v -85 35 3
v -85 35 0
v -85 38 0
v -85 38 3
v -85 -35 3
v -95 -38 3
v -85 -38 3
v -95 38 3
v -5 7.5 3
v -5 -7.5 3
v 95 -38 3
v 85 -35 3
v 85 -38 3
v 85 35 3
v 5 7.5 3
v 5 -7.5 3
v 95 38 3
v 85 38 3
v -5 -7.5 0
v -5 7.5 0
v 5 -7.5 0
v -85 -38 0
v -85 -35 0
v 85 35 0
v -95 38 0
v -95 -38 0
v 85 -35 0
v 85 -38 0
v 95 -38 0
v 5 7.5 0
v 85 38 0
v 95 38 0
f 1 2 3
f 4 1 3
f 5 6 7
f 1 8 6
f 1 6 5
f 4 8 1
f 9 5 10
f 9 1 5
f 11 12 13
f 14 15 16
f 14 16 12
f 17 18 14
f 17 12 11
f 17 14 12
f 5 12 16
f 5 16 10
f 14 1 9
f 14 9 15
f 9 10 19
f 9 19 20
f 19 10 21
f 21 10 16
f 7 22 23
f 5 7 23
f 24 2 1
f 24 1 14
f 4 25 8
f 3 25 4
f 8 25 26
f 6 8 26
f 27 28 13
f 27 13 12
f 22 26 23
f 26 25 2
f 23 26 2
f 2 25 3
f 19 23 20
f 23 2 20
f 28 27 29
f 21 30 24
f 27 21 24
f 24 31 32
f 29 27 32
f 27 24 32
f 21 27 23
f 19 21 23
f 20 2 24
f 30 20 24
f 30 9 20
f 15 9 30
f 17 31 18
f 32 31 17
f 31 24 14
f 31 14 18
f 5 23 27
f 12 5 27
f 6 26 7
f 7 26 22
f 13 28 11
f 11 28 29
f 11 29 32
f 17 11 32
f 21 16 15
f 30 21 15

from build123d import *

# Parameters (mm, degrees)
ESBO_O1_W                = 10
ESBO_O1_H                = 3
ESBO_O1_W_2              = 190
ESBO_O1_H_2              = 70
RESSALTO_EXTRUS_O1_DEPTH = 3
ESBO_O2_W                = 10
ESBO_O2_H                = 15
CORTE_EXTRUS_O1_DEPTH    = 10


with BuildPart() as part:
    # Esboço1 → Ressalto-extrusão1 (new body)
    with BuildSketch(Plane.XY):
        with Locations((-90, -36.5)):
            Rectangle(ESBO_O1_W, ESBO_O1_H)
        with Locations((-90, 36.5)):
            Rectangle(ESBO_O1_W, ESBO_O1_H)
        Rectangle(ESBO_O1_W_2, ESBO_O1_H_2)
        with Locations((90, 36.5)):
            Rectangle(ESBO_O1_W, ESBO_O1_H)
        with Locations((90, -36.5)):
            Rectangle(ESBO_O1_W, ESBO_O1_H)
    extrude(amount=RESSALTO_EXTRUS_O1_DEPTH)

    # Esboço2 → Corte-extrusão1 (cut)
    with BuildSketch(Plane.XY.offset(3)):
        Rectangle(ESBO_O2_W, ESBO_O2_H)
    extrude(amount=-CORTE_EXTRUS_O1_DEPTH, mode=Mode.SUBTRACT)


solid = part.part
